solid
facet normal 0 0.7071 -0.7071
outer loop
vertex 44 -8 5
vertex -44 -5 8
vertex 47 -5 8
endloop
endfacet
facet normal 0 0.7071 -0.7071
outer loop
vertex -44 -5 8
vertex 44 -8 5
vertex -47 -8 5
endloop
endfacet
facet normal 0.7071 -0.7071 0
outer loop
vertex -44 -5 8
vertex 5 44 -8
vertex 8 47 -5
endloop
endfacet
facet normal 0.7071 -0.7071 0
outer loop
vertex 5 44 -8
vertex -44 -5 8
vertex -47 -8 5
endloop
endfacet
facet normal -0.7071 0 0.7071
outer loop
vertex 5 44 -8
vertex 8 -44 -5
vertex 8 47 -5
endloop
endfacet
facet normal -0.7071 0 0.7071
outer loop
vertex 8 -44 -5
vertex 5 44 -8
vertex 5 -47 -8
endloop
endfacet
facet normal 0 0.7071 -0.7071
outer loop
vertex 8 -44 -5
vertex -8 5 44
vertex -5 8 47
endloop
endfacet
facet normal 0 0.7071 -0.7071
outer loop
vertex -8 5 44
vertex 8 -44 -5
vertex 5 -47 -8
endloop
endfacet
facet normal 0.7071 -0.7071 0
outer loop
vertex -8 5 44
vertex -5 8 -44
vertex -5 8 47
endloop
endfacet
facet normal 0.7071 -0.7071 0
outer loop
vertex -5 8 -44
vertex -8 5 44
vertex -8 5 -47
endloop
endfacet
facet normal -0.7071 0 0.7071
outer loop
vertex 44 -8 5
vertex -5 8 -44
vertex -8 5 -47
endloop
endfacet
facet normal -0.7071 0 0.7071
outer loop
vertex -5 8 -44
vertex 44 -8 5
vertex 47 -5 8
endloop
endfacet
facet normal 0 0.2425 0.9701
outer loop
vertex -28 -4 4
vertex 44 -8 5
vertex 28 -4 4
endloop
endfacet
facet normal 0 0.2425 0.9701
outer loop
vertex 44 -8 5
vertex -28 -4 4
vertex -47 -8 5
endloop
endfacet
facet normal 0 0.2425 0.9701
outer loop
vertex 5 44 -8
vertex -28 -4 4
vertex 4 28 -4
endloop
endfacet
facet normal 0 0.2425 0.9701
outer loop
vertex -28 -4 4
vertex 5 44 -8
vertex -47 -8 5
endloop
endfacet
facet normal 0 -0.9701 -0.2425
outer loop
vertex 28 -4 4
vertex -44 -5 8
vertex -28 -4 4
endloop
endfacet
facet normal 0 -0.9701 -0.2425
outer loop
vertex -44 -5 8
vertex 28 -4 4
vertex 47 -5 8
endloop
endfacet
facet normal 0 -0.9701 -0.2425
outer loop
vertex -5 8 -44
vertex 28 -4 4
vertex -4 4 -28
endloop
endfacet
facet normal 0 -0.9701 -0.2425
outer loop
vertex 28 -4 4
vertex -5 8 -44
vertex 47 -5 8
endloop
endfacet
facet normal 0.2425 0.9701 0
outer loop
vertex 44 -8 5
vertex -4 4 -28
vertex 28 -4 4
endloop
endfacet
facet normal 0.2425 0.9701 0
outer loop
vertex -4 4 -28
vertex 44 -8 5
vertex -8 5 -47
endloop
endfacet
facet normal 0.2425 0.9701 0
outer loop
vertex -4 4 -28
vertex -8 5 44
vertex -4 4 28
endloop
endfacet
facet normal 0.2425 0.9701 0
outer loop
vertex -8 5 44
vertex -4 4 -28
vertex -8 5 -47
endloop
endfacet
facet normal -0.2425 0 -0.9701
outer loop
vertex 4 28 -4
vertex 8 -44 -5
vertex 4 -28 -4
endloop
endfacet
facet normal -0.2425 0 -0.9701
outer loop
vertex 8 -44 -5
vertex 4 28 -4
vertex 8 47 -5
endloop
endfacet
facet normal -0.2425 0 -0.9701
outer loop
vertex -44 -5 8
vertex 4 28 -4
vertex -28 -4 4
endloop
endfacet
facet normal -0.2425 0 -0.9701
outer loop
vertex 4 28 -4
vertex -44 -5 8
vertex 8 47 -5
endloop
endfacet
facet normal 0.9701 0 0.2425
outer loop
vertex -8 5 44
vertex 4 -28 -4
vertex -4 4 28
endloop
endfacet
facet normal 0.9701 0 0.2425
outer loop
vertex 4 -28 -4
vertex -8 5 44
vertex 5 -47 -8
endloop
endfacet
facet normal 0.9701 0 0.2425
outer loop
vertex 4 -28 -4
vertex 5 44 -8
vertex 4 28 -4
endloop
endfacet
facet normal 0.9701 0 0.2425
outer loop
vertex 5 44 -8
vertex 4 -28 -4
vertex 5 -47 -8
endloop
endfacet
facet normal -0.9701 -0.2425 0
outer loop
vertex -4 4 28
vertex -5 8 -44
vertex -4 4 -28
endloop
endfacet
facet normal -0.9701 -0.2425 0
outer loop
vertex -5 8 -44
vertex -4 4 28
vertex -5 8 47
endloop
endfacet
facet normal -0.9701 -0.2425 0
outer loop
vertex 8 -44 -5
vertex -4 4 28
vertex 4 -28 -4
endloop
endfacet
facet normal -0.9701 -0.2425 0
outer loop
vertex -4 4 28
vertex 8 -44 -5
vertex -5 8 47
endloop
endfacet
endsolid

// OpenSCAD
// Knotted Dodecahedron
//   coords via: http://dmccooey.com/polyhedra/KnottedDodecahedron.html
//

scaling_factor = 1;

vertices = [
  [-47.0,  -8.0,   5.0], [  5.0, -47.0,  -8.0], [ -8.0,   5.0, -47.0], 
  [ 47.0,  -5.0,   8.0], [  8.0,  47.0,  -5.0], [ -5.0,   8.0,  47.0], 
  [ 44.0,  -8.0,   5.0], [  5.0,  44.0,  -8.0], [ -8.0,   5.0,  44.0], 
  [-44.0,  -5.0,   8.0], [  8.0, -44.0,  -5.0], [ -5.0,   8.0, -44.0], 
  [ 28.0,  -4.0,   4.0], [-28.0,  -4.0,   4.0], [  4.0,  28.0,  -4.0], 
  [  4.0, -28.0,  -4.0], [ -4.0,   4.0,  28.0], [ -4.0,   4.0, -28.0]
];

faces = [
  [ 0,  6,  3,  9],
  [ 0,  9,  4,  7],
  [ 1,  7,  4, 10],
  [ 1, 10,  5,  8],
  [ 2,  8,  5, 11],
  [ 2, 11,  3,  6],
  [12,  6,  0,  7, 14, 13],
  [12, 13,  9,  3, 11, 17],
  [12, 17, 16,  8,  2,  6],
  [15, 10,  4,  9, 13, 14],
  [15, 14,  7,  1,  8, 16],
  [15, 16, 17, 11,  5, 10]
];

scale(scaling_factor) {
  polyhedron(points=vertices, faces=faces, convexity=20);
}
